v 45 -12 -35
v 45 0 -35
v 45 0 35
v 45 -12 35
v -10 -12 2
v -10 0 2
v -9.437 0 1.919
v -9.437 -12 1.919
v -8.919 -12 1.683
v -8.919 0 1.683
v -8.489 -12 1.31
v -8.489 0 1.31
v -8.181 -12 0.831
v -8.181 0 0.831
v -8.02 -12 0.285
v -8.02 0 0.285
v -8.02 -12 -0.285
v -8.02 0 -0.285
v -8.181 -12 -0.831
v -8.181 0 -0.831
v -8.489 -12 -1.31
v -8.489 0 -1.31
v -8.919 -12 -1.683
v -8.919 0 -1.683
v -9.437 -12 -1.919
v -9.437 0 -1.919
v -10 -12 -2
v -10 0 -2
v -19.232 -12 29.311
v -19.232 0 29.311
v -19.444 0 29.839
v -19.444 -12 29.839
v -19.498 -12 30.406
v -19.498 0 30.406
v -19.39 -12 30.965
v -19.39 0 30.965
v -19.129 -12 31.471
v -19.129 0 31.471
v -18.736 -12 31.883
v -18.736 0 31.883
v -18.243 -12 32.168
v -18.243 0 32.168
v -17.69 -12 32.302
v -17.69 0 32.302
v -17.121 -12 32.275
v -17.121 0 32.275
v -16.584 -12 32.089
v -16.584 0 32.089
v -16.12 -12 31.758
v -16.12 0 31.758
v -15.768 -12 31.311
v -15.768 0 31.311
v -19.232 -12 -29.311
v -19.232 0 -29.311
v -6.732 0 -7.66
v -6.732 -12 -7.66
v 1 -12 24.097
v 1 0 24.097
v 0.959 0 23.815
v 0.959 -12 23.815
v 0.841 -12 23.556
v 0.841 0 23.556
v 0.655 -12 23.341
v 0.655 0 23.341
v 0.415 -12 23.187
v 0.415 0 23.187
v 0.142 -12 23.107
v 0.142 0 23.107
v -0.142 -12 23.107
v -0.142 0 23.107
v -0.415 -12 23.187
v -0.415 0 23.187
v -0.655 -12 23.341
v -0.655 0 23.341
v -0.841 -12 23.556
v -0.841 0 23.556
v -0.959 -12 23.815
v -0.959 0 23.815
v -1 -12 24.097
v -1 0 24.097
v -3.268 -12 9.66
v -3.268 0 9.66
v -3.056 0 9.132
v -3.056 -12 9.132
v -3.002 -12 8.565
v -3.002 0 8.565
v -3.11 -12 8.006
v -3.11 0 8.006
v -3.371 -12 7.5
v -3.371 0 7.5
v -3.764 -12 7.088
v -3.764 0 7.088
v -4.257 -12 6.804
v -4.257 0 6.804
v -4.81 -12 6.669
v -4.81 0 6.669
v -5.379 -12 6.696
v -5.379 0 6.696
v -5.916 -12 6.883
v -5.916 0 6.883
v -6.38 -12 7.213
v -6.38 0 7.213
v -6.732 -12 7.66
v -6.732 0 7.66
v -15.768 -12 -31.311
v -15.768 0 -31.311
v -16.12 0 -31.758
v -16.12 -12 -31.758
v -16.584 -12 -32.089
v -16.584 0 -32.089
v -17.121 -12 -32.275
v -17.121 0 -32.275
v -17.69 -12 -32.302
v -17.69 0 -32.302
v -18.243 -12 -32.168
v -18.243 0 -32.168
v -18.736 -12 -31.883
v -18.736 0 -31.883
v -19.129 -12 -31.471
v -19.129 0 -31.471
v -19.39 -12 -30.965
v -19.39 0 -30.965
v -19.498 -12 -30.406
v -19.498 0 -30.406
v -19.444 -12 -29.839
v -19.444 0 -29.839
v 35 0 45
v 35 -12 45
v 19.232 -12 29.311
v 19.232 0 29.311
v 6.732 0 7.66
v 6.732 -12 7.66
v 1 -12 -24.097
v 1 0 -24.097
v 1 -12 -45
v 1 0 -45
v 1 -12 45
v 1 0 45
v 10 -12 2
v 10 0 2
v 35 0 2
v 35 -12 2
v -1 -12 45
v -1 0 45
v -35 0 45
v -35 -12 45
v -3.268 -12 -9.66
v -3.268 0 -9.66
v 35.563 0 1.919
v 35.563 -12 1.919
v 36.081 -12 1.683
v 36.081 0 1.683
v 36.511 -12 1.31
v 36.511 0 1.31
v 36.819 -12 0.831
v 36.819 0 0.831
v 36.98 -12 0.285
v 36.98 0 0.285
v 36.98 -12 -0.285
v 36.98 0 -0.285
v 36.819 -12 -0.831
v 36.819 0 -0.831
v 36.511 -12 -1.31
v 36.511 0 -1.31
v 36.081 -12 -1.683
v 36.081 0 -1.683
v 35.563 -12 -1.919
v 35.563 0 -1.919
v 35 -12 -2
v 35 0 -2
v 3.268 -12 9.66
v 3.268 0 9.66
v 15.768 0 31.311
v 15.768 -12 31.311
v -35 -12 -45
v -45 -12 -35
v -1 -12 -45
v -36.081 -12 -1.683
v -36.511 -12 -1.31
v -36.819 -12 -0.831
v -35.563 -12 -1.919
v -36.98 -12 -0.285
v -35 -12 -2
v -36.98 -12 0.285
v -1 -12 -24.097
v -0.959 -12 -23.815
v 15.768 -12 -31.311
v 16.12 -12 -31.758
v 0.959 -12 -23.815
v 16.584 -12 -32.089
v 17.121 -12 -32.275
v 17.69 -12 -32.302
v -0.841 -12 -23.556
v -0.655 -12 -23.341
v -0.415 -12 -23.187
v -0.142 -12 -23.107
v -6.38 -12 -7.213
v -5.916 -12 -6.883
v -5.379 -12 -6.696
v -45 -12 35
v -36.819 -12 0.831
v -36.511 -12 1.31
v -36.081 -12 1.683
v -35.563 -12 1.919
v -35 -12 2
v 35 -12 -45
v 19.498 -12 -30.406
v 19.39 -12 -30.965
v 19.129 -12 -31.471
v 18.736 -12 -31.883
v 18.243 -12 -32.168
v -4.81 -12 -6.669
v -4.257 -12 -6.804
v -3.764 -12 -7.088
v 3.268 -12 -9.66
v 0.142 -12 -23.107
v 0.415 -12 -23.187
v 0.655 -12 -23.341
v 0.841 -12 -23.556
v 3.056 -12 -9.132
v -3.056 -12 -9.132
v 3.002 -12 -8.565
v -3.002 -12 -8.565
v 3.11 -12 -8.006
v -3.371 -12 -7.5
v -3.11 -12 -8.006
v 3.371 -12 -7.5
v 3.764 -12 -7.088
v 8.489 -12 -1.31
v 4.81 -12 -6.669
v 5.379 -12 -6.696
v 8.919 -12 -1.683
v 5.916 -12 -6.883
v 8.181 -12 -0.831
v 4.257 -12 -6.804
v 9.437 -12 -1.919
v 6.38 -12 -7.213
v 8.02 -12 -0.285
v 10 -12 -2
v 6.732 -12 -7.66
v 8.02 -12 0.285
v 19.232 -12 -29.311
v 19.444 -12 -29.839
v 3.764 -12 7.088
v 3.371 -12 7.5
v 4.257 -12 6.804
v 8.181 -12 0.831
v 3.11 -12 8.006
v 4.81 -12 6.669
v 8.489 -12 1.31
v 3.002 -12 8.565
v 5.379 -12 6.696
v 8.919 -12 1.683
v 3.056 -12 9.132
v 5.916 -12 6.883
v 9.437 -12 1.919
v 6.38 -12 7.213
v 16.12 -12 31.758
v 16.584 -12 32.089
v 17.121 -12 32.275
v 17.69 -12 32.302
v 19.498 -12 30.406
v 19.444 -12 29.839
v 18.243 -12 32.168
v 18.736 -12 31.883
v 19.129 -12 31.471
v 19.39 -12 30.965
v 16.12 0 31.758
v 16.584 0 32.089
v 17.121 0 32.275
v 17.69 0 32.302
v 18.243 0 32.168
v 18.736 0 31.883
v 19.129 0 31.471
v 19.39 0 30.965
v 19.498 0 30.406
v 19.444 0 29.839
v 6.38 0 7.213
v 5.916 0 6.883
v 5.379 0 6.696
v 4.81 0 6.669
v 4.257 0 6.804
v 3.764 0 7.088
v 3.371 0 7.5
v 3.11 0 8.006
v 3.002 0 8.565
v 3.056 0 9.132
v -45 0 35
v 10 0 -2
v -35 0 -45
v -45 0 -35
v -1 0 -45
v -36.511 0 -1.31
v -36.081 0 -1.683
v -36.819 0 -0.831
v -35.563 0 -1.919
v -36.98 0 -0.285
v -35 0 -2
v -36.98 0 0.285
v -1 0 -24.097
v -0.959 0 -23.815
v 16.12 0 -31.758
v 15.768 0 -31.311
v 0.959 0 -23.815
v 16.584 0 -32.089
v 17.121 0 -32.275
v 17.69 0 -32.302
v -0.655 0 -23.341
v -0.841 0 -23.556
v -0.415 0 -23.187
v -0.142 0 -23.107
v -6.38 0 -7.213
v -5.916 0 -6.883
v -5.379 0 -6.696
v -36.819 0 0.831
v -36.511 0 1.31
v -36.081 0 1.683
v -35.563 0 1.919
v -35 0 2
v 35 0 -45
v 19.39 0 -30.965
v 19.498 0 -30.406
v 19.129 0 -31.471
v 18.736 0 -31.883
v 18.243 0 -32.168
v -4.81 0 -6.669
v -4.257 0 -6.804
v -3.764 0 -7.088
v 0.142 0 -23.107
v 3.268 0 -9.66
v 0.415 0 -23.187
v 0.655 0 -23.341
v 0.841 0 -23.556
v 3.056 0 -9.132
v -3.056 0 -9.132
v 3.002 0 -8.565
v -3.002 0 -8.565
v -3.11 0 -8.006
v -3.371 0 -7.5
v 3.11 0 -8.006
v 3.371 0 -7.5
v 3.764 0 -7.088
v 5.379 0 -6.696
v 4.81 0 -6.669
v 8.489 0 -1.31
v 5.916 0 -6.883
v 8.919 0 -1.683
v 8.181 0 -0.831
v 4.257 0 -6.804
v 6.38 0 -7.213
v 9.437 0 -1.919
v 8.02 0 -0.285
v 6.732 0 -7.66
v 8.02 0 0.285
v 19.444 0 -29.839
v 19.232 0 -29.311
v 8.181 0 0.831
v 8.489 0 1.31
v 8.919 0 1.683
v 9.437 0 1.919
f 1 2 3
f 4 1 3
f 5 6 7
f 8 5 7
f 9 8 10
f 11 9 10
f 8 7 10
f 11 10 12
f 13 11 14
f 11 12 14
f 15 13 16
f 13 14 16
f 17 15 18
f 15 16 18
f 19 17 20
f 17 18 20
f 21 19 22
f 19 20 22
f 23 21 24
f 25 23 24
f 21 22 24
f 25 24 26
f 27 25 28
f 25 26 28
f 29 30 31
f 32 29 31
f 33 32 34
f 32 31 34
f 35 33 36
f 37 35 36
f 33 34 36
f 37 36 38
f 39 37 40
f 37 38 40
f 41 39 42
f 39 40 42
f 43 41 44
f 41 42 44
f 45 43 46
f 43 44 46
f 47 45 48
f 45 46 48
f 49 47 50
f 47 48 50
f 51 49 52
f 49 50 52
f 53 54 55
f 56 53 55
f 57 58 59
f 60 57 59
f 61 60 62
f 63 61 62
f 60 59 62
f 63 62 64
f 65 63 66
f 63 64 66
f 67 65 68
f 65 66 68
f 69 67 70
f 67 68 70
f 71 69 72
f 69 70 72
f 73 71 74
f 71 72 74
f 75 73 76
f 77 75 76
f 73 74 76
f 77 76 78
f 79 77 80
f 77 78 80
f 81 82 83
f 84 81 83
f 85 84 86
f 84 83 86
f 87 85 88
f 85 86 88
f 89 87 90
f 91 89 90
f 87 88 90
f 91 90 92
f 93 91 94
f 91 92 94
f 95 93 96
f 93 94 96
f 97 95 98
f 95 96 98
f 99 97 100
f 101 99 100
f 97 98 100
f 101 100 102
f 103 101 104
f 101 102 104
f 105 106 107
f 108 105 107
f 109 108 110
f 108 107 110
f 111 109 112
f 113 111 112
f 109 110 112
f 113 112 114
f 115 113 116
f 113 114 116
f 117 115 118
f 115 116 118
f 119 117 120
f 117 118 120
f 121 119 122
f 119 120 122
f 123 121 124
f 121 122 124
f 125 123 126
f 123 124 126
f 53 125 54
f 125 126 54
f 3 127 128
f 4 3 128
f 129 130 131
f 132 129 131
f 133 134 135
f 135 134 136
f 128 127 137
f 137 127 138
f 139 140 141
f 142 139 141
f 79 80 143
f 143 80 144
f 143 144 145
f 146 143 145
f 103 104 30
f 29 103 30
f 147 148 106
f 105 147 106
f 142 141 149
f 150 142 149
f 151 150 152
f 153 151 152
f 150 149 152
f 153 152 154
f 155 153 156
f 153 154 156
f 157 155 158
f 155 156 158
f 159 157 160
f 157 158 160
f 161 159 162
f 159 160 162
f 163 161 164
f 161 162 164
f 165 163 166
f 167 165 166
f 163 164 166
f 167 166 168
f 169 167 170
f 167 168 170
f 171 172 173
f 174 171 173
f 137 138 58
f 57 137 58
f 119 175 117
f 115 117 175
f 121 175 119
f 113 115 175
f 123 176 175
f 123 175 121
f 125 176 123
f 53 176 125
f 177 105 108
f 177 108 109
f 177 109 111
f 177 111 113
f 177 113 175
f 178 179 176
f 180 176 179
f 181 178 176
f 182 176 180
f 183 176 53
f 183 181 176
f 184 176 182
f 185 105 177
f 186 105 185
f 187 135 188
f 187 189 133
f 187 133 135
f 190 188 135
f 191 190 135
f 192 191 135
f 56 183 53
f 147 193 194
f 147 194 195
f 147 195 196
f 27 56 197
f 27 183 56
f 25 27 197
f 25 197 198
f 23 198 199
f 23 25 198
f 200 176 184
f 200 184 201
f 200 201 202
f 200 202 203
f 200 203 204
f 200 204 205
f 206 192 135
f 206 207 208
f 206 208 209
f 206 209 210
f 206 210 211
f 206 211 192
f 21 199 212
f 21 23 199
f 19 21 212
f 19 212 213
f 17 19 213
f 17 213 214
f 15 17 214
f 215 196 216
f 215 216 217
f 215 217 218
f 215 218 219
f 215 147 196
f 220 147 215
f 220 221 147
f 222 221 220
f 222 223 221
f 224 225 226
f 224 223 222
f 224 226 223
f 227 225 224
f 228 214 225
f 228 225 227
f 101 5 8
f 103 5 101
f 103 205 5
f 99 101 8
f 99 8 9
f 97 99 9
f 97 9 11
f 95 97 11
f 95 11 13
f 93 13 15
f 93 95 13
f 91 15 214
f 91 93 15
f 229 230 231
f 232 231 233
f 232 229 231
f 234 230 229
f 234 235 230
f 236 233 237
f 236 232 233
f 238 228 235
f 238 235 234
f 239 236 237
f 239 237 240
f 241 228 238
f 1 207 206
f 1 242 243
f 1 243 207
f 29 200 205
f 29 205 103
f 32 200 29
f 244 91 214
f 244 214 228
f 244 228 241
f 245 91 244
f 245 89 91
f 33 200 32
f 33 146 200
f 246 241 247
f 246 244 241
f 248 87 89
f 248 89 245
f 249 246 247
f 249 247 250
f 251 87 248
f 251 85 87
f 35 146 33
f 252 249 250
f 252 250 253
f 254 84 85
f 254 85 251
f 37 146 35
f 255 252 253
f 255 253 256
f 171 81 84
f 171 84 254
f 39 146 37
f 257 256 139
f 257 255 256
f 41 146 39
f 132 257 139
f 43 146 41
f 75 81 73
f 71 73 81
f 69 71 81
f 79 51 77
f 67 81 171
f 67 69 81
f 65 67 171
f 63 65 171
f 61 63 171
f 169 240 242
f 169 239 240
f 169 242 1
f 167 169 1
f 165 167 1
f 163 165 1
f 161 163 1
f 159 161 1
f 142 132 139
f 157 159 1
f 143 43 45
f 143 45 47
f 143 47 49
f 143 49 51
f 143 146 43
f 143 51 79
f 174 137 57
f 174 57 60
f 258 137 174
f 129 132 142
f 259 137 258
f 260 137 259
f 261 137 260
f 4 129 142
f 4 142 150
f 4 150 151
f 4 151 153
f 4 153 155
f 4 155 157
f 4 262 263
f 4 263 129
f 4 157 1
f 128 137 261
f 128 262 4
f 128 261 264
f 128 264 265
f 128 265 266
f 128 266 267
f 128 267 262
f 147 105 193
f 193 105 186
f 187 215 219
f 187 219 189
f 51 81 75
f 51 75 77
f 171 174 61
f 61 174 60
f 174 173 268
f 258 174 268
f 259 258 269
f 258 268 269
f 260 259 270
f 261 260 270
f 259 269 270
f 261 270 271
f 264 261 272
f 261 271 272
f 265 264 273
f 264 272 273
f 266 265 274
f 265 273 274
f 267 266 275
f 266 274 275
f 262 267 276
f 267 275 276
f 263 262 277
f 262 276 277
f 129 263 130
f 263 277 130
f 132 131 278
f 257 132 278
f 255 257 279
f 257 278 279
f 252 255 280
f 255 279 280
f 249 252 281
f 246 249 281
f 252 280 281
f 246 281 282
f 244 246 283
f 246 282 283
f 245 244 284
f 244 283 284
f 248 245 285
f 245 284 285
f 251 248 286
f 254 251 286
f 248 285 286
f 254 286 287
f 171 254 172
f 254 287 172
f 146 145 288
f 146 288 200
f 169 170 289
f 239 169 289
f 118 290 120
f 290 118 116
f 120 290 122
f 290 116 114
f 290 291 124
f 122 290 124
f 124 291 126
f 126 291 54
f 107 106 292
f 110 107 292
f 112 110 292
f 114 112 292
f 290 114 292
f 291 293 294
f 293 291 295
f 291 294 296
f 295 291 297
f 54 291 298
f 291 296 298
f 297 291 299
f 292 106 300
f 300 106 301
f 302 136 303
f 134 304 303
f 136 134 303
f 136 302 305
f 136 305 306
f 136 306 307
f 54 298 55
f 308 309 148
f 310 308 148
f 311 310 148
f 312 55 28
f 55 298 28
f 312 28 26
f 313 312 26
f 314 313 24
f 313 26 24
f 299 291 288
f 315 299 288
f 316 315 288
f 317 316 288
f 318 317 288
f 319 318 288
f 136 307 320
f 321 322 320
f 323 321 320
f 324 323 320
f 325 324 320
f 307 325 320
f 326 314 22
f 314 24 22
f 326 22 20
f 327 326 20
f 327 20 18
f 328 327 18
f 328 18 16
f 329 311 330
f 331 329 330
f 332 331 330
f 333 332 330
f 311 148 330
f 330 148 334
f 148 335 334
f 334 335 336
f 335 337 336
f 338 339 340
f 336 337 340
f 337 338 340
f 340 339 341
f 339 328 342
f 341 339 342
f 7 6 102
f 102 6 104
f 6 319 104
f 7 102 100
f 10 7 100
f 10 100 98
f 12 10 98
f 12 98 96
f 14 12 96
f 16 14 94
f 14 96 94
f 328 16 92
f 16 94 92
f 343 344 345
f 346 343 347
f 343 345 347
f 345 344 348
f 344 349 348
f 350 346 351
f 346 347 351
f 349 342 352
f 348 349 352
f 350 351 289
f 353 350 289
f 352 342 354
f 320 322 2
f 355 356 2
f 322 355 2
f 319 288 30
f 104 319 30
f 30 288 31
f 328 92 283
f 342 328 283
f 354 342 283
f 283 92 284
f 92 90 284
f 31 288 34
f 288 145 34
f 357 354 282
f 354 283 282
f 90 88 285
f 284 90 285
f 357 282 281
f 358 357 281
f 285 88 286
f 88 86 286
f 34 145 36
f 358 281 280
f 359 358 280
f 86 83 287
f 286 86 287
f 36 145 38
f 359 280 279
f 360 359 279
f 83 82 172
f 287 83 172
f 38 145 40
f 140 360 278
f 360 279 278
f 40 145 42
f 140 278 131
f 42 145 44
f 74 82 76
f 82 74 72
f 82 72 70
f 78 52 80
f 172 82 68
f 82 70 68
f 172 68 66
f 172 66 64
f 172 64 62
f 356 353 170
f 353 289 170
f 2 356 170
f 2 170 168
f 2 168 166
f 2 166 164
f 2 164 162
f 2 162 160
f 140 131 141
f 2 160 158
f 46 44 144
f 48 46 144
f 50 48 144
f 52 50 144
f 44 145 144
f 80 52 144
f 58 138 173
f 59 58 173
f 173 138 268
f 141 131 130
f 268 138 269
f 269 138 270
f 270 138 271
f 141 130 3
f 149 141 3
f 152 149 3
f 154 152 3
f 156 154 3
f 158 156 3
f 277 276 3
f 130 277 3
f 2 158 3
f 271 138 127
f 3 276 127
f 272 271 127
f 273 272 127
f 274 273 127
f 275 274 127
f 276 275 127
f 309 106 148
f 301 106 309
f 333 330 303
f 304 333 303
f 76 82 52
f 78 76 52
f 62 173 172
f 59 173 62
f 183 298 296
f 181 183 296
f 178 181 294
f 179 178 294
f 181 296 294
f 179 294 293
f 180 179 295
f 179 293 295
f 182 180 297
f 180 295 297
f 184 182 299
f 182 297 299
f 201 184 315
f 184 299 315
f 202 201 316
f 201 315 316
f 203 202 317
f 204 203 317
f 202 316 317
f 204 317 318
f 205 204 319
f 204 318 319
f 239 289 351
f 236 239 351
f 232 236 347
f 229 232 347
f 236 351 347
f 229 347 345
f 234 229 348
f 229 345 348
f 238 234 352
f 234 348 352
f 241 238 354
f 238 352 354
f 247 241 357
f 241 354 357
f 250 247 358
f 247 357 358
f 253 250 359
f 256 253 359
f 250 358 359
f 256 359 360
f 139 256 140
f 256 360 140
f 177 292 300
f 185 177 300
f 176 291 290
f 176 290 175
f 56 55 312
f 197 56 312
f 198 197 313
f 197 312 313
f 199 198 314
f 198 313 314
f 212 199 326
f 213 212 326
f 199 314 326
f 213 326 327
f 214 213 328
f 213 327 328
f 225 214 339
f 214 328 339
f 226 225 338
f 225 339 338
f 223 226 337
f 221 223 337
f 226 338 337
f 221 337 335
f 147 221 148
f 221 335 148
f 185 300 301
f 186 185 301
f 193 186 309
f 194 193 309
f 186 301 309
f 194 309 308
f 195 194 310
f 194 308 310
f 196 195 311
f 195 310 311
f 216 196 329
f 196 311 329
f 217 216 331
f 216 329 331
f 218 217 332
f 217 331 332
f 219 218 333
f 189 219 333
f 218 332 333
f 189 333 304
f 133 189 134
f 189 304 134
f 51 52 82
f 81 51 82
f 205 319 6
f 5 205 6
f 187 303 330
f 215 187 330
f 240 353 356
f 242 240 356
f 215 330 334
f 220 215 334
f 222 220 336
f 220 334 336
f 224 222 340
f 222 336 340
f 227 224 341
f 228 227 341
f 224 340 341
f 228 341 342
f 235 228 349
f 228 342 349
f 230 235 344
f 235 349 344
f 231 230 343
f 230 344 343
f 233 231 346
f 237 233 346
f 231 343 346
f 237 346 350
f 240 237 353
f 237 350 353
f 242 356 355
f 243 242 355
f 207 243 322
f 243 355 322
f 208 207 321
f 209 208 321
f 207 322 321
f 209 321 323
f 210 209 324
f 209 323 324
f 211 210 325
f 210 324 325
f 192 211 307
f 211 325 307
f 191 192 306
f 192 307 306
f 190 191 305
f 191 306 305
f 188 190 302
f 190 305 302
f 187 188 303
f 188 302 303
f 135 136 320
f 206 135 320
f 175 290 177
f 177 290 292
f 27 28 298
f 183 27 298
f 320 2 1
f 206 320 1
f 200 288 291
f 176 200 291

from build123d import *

# Parameters (mm, degrees)
F1_DEPTH = 12
F2_SIZE  = 10


with BuildPart() as f1:
    # F0 (on Front) → F1 (new body)
    with BuildSketch(Plane.XZ):
        with BuildLine():
            Line((1, -45), (45, -45))
            Line((45, -45), (45, 45))
            Line((45, 45), (1, 45))
            Line((1, 45), (1, 24.096539))
            ThreePointArc((1, 24.096539), (0, 23.096539), (-1, 24.096539))
            Line((-1, 24.096539), (-1, 45))
            Line((-1, 45), (-45, 45))
            Line((-45, 45), (-45, -45))
            Line((-45, -45), (-1, -45))
            Line((-1, -45), (-1, -24.096539))
            ThreePointArc((-1, -24.096539), (0, -23.096539), (1, -24.096539))
            Line((1, -24.096539), (1, -45))
        make_face()
        with BuildLine():
            ThreePointArc((-6.732051, -7.660254), (-4, -6.928203), (-3.267949, -9.660254))
            Line((-3.267949, -9.660254), (-15.767949, -31.310889))
            ThreePointArc((-15.767949, -31.310889), (-18.5, -32.04294), (-19.232051, -29.310889))
            Line((-19.232051, -29.310889), (-6.732051, -7.660254))
        make_face(mode=Mode.SUBTRACT)
        with BuildLine():
            ThreePointArc((3.267949, -9.660254), (4, -6.928203), (6.732051, -7.660254))
            Line((6.732051, -7.660254), (19.232051, -29.310889))
            ThreePointArc((19.232051, -29.310889), (18.5, -32.04294), (15.767949, -31.310889))
            Line((15.767949, -31.310889), (3.267949, -9.660254))
        make_face(mode=Mode.SUBTRACT)
        with BuildLine():
            Line((-35, 2), (-10, 2))
            ThreePointArc((-10, 2), (-8, 0), (-10, -2))
            Line((-10, -2), (-35, -2))
            ThreePointArc((-35, -2), (-37, 0), (-35, 2))
        make_face(mode=Mode.SUBTRACT)
        with BuildLine():
            ThreePointArc((-3.267949, 9.660254), (-4, 6.928203), (-6.732051, 7.660254))
            Line((-6.732051, 7.660254), (-19.232051, 29.310889))
            ThreePointArc((-19.232051, 29.310889), (-18.5, 32.04294), (-15.767949, 31.310889))
            Line((-15.767949, 31.310889), (-3.267949, 9.660254))
        make_face(mode=Mode.SUBTRACT)
        with BuildLine():
            ThreePointArc((6.732051, 7.660254), (4, 6.928203), (3.267949, 9.660254))
            Line((3.267949, 9.660254), (15.767949, 31.310889))
            ThreePointArc((15.767949, 31.310889), (18.5, 32.04294), (19.232051, 29.310889))
            Line((19.232051, 29.310889), (6.732051, 7.660254))
        make_face(mode=Mode.SUBTRACT)
        with BuildLine():
            ThreePointArc((10, -2), (8, 0), (10, 2))
            Line((10, 2), (35, 2))
            ThreePointArc((35, 2), (37, 0), (35, -2))
            Line((35, -2), (10, -2))
        make_face(mode=Mode.SUBTRACT)
    extrude(amount=F1_DEPTH)

    # F2
    f2_edges = [f1.edges().sort_by_distance(p)[0] for p in [
        (45, -6, 45),
        (45, -6, -45),
        (-45, -6, 45),
        (-45, -6, -45),
    ]]
    chamfer(f2_edges, length=F2_SIZE)


solid = f1.part
